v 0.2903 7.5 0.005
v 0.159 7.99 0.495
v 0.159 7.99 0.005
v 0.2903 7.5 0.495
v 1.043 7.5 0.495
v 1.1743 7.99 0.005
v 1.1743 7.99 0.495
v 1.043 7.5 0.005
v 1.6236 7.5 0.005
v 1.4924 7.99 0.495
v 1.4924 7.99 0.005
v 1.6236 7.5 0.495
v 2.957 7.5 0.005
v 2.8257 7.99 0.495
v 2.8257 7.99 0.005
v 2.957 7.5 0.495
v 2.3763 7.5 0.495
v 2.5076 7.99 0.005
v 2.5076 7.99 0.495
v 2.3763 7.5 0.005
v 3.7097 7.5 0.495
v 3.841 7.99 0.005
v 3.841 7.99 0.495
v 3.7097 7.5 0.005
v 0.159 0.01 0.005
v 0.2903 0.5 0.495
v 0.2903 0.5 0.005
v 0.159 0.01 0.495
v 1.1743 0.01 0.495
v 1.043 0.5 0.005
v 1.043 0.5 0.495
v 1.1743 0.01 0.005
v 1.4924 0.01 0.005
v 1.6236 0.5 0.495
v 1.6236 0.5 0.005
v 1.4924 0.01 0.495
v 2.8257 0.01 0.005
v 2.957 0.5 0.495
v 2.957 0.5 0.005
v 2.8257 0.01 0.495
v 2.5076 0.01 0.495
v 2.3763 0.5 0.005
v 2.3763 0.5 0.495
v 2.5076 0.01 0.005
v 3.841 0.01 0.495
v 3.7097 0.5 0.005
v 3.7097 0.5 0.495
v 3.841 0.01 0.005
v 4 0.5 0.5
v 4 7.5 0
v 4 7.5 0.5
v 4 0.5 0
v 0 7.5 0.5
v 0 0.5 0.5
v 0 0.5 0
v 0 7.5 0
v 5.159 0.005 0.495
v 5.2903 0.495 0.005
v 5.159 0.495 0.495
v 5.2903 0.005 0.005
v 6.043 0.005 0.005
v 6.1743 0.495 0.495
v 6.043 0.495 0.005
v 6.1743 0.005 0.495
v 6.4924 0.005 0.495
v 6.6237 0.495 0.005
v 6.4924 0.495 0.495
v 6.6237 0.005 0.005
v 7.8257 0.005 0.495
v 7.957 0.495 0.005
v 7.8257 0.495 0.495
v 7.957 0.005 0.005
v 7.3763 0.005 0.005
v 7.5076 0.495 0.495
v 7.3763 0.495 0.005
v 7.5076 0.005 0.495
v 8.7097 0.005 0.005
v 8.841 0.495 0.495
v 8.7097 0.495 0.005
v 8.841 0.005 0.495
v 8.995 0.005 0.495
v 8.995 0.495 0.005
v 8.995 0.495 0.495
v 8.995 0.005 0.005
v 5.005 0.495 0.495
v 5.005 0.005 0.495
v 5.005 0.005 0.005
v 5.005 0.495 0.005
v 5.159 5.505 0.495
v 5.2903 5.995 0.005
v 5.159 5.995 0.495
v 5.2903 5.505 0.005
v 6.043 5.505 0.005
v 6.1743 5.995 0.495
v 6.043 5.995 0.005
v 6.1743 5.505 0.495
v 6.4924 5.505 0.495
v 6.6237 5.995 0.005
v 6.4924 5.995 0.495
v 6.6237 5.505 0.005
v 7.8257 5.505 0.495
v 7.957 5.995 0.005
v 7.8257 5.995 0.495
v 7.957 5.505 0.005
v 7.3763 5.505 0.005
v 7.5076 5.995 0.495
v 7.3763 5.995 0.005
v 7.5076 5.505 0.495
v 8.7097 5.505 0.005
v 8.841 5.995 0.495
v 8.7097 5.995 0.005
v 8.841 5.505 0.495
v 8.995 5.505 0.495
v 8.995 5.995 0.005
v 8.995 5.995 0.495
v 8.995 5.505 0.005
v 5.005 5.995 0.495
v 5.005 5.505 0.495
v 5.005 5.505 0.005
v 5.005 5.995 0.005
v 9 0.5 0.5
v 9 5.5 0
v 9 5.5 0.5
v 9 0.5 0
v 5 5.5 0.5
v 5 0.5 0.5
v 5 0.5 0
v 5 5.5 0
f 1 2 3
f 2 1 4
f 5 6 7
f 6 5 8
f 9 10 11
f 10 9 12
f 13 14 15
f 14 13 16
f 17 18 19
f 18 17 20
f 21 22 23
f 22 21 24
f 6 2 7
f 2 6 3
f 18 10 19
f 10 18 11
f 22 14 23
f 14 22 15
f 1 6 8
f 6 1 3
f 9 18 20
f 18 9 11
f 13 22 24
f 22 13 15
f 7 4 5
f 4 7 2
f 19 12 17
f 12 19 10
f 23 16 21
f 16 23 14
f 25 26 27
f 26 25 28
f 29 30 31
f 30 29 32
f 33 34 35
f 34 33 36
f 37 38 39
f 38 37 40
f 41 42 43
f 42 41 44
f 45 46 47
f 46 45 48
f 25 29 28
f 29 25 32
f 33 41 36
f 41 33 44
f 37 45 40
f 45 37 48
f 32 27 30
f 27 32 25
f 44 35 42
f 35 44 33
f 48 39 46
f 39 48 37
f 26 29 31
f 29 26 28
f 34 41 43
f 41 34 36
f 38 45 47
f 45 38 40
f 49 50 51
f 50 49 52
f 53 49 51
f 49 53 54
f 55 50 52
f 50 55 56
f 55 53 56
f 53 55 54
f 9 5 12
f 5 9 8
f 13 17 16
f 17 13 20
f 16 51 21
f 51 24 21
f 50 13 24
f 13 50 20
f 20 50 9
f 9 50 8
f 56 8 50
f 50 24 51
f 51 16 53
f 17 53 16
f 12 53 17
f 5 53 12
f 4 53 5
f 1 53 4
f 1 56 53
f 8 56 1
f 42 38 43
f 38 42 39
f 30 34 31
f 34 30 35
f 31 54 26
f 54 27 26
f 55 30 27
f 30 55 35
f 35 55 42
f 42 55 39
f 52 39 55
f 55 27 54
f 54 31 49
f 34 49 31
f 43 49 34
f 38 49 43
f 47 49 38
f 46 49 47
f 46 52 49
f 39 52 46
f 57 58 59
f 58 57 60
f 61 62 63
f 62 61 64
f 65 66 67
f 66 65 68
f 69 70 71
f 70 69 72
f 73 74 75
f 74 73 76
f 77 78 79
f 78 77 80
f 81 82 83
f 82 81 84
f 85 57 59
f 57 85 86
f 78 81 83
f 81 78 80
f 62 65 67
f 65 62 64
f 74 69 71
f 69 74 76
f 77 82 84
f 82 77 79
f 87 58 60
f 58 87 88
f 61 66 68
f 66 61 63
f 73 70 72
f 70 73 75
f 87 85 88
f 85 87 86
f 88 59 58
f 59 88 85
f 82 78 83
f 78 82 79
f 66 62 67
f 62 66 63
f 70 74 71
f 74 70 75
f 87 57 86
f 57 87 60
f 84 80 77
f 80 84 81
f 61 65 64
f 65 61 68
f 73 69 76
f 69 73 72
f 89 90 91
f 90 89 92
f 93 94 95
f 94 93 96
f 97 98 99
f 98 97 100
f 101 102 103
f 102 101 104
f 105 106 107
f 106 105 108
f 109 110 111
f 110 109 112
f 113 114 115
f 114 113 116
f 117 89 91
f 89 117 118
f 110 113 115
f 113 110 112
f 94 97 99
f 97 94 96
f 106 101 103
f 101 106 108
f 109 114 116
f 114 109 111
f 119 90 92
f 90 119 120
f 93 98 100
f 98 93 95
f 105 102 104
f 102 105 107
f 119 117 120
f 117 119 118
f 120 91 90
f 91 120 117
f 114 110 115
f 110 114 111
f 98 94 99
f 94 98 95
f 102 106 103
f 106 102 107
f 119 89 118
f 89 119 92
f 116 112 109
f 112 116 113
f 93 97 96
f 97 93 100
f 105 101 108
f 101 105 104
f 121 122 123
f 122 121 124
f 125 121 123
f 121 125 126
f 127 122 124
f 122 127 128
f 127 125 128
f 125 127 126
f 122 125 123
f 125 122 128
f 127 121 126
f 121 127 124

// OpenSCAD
// Source: https://github.com/cfinke/OpenSCAD-Dovetails

/**
 * pin_length is measured along the same axis as the length of the board.
 * pin_width is the width of the bottom of the pins, where they're widest.
 * pin_thickness is measured along the same axis as the board thickness.
 * tail_width is the width of the tails where they meet the bottom of the pins, where they're narrowest.
 */
module dovetail_pins(pin_length=.75, pin_width=1, pin_thickness=.75, pin_count=4, angle=15, tail_width=1) {
    intersection() {
        translate([0.005, 0.005, 0.005]) cube([(pin_count-1)*(pin_width+tail_width)-0.01, pin_length-0.01, pin_thickness-0.01]);
        dovetail_pins_idealized(
            pin_length=pin_length,
            pin_width=pin_width,
            pin_thickness=pin_thickness,
            pin_count=pin_count,
            angle=angle,
            tail_width=tail_width
        );
    }
}

/**
 * tail_length is measured along the same axis as the length of the board.
 * tail_width is the width of the tails where they meet the board, where they're narrowest.
 * tail_thickness is measured along the same axis as the board thickness.
 * pin_width is the width of the bottom of the pins, where they're widest.
 */
module dovetail_tails(tail_length=.75, tail_width=1, tail_thickness=.75, tail_count=3, angle=15, pin_width=1) {
    pin_count = tail_count + 1;
    pin_thickness = tail_length;
    pin_length = tail_thickness;
    
    translate([0, 0, tail_thickness]) {
        rotate([-90, 0, 0]) {
            translate([0, 0, -0.005]) {
                difference() {
                    translate([0.005, 0.005, 0.005]) {
                        cube([(pin_count-1)*(pin_width+tail_width)-0.01, tail_thickness-0.01, tail_length-0.01]);
                    }

                    dovetail_pins_idealized(
                        pin_length=pin_length,
                        pin_width=pin_width,
                        pin_thickness=pin_thickness,
                        pin_count=pin_count,
                        angle=angle,
                        tail_width=tail_width
                    );
                }
            }
        }
    }
}

/**
 * Used for generating both pins and tails. Don't call this directly.
 */
module dovetail_pins_idealized(
    pin_length=.75,
    pin_width=1,
    pin_thickness=.75,
    pin_count=4,
    angle=15,
    tail_width=1) {
        
    pin_width_top = pin_width - ( 2 * tan(angle) * pin_thickness );
    
    translate([0, pin_length, 0]) {
        rotate([90, 0, 0]) {
            intersection() {
                cube([(pin_count-1)*(pin_width+tail_width), pin_thickness, pin_length]);
                
                for (pin = [0:pin_count-1]) {
                    translate([pin * (pin_width + tail_width), 0]) {
                        linear_extrude(pin_length) {
                            polygon([
                                [-pin_width/2, 0], 
                                [-pin_width_top/2, pin_thickness],
                                [pin_width_top/2, pin_thickness],
                                [pin_width/2, 0]
                            ]);
                        }
                    }
                }
            }
        }
    }
}

/**
 * Determine the width the pins need to be once the tail widths are chosen.
 */
function pin_width (tail_width, tail_count, board_width) = ( board_width - (tail_width * tail_count) ) / (tail_count);

/**
 * Construct a board with tails cut into it. board_length includes the length of the tails.
 */
module board_with_dovetail_tails(board_length, board_width, board_thickness, tail_length, tail_width, pin_width, tail_count, angle) {
    
    tail_thickness = board_thickness;
    
    pin_width = pin_width(tail_width = tail_width, tail_count=tail_count, board_width=board_width);
    translate([0, board_length - ( 2 * tail_length) + tail_length, 0]) {
        dovetail_tails(tail_length=tail_length, tail_width=tail_width, tail_thickness=tail_thickness, tail_count=tail_count, angle=angle, pin_width=pin_width);
    }
    translate([0, tail_length, 0]) cube([board_width, board_length - ( 2 * tail_length), board_thickness]);
    translate([0, tail_length, 0]) mirror([0,1,0]) dovetail_tails(tail_length=tail_length, tail_width=tail_width, tail_thickness=tail_thickness, tail_count=tail_count, angle=angle, pin_width=pin_width);
}

/**
 * Construct a board with pins cut into it. board_length includes the length of the pins.
 */
module board_with_dovetail_pins(board_length, board_width, board_thickness, pin_length, tail_width, pin_width, pin_count, angle) {
    translate([0, board_length - ( 2 * pin_length) + pin_length, 0]) {
        dovetail_pins(pin_length=pin_length, pin_width=pin_width, pin_thickness=board_thickness, pin_count=pin_count, angle=angle, tail_width=tail_width);
    }
    translate([0, pin_length, 0]) cube([board_width, board_length - ( 2 * pin_length), board_thickness]);
        dovetail_pins(pin_length=pin_length, pin_width=pin_width, pin_thickness=board_thickness, pin_count=pin_count, angle=angle, tail_width=tail_width);
}

// An example set of boards.
tail_width = .75;
tail_count = 3;
board_width = 4;
angle = 15;
board_thickness = 0.5;
pin_width = pin_width(tail_width = tail_width, tail_count=tail_count, board_width=board_width);

board_with_dovetail_tails(
    board_length=8,
    board_width=board_width,
    board_thickness=board_thickness,
    tail_length=.5,
    tail_width=tail_width,
    pin_width=pin_width,
    tail_count=tail_count,
    angle=angle
);

translate([board_width + 1, 0, 0]) board_with_dovetail_pins(
    board_length=6,
    board_width=board_width,
    board_thickness=board_thickness,
    pin_length=.5,
    tail_width=tail_width,
    pin_width=pin_width,
    pin_count = tail_count + 1,
    angle=angle
);
